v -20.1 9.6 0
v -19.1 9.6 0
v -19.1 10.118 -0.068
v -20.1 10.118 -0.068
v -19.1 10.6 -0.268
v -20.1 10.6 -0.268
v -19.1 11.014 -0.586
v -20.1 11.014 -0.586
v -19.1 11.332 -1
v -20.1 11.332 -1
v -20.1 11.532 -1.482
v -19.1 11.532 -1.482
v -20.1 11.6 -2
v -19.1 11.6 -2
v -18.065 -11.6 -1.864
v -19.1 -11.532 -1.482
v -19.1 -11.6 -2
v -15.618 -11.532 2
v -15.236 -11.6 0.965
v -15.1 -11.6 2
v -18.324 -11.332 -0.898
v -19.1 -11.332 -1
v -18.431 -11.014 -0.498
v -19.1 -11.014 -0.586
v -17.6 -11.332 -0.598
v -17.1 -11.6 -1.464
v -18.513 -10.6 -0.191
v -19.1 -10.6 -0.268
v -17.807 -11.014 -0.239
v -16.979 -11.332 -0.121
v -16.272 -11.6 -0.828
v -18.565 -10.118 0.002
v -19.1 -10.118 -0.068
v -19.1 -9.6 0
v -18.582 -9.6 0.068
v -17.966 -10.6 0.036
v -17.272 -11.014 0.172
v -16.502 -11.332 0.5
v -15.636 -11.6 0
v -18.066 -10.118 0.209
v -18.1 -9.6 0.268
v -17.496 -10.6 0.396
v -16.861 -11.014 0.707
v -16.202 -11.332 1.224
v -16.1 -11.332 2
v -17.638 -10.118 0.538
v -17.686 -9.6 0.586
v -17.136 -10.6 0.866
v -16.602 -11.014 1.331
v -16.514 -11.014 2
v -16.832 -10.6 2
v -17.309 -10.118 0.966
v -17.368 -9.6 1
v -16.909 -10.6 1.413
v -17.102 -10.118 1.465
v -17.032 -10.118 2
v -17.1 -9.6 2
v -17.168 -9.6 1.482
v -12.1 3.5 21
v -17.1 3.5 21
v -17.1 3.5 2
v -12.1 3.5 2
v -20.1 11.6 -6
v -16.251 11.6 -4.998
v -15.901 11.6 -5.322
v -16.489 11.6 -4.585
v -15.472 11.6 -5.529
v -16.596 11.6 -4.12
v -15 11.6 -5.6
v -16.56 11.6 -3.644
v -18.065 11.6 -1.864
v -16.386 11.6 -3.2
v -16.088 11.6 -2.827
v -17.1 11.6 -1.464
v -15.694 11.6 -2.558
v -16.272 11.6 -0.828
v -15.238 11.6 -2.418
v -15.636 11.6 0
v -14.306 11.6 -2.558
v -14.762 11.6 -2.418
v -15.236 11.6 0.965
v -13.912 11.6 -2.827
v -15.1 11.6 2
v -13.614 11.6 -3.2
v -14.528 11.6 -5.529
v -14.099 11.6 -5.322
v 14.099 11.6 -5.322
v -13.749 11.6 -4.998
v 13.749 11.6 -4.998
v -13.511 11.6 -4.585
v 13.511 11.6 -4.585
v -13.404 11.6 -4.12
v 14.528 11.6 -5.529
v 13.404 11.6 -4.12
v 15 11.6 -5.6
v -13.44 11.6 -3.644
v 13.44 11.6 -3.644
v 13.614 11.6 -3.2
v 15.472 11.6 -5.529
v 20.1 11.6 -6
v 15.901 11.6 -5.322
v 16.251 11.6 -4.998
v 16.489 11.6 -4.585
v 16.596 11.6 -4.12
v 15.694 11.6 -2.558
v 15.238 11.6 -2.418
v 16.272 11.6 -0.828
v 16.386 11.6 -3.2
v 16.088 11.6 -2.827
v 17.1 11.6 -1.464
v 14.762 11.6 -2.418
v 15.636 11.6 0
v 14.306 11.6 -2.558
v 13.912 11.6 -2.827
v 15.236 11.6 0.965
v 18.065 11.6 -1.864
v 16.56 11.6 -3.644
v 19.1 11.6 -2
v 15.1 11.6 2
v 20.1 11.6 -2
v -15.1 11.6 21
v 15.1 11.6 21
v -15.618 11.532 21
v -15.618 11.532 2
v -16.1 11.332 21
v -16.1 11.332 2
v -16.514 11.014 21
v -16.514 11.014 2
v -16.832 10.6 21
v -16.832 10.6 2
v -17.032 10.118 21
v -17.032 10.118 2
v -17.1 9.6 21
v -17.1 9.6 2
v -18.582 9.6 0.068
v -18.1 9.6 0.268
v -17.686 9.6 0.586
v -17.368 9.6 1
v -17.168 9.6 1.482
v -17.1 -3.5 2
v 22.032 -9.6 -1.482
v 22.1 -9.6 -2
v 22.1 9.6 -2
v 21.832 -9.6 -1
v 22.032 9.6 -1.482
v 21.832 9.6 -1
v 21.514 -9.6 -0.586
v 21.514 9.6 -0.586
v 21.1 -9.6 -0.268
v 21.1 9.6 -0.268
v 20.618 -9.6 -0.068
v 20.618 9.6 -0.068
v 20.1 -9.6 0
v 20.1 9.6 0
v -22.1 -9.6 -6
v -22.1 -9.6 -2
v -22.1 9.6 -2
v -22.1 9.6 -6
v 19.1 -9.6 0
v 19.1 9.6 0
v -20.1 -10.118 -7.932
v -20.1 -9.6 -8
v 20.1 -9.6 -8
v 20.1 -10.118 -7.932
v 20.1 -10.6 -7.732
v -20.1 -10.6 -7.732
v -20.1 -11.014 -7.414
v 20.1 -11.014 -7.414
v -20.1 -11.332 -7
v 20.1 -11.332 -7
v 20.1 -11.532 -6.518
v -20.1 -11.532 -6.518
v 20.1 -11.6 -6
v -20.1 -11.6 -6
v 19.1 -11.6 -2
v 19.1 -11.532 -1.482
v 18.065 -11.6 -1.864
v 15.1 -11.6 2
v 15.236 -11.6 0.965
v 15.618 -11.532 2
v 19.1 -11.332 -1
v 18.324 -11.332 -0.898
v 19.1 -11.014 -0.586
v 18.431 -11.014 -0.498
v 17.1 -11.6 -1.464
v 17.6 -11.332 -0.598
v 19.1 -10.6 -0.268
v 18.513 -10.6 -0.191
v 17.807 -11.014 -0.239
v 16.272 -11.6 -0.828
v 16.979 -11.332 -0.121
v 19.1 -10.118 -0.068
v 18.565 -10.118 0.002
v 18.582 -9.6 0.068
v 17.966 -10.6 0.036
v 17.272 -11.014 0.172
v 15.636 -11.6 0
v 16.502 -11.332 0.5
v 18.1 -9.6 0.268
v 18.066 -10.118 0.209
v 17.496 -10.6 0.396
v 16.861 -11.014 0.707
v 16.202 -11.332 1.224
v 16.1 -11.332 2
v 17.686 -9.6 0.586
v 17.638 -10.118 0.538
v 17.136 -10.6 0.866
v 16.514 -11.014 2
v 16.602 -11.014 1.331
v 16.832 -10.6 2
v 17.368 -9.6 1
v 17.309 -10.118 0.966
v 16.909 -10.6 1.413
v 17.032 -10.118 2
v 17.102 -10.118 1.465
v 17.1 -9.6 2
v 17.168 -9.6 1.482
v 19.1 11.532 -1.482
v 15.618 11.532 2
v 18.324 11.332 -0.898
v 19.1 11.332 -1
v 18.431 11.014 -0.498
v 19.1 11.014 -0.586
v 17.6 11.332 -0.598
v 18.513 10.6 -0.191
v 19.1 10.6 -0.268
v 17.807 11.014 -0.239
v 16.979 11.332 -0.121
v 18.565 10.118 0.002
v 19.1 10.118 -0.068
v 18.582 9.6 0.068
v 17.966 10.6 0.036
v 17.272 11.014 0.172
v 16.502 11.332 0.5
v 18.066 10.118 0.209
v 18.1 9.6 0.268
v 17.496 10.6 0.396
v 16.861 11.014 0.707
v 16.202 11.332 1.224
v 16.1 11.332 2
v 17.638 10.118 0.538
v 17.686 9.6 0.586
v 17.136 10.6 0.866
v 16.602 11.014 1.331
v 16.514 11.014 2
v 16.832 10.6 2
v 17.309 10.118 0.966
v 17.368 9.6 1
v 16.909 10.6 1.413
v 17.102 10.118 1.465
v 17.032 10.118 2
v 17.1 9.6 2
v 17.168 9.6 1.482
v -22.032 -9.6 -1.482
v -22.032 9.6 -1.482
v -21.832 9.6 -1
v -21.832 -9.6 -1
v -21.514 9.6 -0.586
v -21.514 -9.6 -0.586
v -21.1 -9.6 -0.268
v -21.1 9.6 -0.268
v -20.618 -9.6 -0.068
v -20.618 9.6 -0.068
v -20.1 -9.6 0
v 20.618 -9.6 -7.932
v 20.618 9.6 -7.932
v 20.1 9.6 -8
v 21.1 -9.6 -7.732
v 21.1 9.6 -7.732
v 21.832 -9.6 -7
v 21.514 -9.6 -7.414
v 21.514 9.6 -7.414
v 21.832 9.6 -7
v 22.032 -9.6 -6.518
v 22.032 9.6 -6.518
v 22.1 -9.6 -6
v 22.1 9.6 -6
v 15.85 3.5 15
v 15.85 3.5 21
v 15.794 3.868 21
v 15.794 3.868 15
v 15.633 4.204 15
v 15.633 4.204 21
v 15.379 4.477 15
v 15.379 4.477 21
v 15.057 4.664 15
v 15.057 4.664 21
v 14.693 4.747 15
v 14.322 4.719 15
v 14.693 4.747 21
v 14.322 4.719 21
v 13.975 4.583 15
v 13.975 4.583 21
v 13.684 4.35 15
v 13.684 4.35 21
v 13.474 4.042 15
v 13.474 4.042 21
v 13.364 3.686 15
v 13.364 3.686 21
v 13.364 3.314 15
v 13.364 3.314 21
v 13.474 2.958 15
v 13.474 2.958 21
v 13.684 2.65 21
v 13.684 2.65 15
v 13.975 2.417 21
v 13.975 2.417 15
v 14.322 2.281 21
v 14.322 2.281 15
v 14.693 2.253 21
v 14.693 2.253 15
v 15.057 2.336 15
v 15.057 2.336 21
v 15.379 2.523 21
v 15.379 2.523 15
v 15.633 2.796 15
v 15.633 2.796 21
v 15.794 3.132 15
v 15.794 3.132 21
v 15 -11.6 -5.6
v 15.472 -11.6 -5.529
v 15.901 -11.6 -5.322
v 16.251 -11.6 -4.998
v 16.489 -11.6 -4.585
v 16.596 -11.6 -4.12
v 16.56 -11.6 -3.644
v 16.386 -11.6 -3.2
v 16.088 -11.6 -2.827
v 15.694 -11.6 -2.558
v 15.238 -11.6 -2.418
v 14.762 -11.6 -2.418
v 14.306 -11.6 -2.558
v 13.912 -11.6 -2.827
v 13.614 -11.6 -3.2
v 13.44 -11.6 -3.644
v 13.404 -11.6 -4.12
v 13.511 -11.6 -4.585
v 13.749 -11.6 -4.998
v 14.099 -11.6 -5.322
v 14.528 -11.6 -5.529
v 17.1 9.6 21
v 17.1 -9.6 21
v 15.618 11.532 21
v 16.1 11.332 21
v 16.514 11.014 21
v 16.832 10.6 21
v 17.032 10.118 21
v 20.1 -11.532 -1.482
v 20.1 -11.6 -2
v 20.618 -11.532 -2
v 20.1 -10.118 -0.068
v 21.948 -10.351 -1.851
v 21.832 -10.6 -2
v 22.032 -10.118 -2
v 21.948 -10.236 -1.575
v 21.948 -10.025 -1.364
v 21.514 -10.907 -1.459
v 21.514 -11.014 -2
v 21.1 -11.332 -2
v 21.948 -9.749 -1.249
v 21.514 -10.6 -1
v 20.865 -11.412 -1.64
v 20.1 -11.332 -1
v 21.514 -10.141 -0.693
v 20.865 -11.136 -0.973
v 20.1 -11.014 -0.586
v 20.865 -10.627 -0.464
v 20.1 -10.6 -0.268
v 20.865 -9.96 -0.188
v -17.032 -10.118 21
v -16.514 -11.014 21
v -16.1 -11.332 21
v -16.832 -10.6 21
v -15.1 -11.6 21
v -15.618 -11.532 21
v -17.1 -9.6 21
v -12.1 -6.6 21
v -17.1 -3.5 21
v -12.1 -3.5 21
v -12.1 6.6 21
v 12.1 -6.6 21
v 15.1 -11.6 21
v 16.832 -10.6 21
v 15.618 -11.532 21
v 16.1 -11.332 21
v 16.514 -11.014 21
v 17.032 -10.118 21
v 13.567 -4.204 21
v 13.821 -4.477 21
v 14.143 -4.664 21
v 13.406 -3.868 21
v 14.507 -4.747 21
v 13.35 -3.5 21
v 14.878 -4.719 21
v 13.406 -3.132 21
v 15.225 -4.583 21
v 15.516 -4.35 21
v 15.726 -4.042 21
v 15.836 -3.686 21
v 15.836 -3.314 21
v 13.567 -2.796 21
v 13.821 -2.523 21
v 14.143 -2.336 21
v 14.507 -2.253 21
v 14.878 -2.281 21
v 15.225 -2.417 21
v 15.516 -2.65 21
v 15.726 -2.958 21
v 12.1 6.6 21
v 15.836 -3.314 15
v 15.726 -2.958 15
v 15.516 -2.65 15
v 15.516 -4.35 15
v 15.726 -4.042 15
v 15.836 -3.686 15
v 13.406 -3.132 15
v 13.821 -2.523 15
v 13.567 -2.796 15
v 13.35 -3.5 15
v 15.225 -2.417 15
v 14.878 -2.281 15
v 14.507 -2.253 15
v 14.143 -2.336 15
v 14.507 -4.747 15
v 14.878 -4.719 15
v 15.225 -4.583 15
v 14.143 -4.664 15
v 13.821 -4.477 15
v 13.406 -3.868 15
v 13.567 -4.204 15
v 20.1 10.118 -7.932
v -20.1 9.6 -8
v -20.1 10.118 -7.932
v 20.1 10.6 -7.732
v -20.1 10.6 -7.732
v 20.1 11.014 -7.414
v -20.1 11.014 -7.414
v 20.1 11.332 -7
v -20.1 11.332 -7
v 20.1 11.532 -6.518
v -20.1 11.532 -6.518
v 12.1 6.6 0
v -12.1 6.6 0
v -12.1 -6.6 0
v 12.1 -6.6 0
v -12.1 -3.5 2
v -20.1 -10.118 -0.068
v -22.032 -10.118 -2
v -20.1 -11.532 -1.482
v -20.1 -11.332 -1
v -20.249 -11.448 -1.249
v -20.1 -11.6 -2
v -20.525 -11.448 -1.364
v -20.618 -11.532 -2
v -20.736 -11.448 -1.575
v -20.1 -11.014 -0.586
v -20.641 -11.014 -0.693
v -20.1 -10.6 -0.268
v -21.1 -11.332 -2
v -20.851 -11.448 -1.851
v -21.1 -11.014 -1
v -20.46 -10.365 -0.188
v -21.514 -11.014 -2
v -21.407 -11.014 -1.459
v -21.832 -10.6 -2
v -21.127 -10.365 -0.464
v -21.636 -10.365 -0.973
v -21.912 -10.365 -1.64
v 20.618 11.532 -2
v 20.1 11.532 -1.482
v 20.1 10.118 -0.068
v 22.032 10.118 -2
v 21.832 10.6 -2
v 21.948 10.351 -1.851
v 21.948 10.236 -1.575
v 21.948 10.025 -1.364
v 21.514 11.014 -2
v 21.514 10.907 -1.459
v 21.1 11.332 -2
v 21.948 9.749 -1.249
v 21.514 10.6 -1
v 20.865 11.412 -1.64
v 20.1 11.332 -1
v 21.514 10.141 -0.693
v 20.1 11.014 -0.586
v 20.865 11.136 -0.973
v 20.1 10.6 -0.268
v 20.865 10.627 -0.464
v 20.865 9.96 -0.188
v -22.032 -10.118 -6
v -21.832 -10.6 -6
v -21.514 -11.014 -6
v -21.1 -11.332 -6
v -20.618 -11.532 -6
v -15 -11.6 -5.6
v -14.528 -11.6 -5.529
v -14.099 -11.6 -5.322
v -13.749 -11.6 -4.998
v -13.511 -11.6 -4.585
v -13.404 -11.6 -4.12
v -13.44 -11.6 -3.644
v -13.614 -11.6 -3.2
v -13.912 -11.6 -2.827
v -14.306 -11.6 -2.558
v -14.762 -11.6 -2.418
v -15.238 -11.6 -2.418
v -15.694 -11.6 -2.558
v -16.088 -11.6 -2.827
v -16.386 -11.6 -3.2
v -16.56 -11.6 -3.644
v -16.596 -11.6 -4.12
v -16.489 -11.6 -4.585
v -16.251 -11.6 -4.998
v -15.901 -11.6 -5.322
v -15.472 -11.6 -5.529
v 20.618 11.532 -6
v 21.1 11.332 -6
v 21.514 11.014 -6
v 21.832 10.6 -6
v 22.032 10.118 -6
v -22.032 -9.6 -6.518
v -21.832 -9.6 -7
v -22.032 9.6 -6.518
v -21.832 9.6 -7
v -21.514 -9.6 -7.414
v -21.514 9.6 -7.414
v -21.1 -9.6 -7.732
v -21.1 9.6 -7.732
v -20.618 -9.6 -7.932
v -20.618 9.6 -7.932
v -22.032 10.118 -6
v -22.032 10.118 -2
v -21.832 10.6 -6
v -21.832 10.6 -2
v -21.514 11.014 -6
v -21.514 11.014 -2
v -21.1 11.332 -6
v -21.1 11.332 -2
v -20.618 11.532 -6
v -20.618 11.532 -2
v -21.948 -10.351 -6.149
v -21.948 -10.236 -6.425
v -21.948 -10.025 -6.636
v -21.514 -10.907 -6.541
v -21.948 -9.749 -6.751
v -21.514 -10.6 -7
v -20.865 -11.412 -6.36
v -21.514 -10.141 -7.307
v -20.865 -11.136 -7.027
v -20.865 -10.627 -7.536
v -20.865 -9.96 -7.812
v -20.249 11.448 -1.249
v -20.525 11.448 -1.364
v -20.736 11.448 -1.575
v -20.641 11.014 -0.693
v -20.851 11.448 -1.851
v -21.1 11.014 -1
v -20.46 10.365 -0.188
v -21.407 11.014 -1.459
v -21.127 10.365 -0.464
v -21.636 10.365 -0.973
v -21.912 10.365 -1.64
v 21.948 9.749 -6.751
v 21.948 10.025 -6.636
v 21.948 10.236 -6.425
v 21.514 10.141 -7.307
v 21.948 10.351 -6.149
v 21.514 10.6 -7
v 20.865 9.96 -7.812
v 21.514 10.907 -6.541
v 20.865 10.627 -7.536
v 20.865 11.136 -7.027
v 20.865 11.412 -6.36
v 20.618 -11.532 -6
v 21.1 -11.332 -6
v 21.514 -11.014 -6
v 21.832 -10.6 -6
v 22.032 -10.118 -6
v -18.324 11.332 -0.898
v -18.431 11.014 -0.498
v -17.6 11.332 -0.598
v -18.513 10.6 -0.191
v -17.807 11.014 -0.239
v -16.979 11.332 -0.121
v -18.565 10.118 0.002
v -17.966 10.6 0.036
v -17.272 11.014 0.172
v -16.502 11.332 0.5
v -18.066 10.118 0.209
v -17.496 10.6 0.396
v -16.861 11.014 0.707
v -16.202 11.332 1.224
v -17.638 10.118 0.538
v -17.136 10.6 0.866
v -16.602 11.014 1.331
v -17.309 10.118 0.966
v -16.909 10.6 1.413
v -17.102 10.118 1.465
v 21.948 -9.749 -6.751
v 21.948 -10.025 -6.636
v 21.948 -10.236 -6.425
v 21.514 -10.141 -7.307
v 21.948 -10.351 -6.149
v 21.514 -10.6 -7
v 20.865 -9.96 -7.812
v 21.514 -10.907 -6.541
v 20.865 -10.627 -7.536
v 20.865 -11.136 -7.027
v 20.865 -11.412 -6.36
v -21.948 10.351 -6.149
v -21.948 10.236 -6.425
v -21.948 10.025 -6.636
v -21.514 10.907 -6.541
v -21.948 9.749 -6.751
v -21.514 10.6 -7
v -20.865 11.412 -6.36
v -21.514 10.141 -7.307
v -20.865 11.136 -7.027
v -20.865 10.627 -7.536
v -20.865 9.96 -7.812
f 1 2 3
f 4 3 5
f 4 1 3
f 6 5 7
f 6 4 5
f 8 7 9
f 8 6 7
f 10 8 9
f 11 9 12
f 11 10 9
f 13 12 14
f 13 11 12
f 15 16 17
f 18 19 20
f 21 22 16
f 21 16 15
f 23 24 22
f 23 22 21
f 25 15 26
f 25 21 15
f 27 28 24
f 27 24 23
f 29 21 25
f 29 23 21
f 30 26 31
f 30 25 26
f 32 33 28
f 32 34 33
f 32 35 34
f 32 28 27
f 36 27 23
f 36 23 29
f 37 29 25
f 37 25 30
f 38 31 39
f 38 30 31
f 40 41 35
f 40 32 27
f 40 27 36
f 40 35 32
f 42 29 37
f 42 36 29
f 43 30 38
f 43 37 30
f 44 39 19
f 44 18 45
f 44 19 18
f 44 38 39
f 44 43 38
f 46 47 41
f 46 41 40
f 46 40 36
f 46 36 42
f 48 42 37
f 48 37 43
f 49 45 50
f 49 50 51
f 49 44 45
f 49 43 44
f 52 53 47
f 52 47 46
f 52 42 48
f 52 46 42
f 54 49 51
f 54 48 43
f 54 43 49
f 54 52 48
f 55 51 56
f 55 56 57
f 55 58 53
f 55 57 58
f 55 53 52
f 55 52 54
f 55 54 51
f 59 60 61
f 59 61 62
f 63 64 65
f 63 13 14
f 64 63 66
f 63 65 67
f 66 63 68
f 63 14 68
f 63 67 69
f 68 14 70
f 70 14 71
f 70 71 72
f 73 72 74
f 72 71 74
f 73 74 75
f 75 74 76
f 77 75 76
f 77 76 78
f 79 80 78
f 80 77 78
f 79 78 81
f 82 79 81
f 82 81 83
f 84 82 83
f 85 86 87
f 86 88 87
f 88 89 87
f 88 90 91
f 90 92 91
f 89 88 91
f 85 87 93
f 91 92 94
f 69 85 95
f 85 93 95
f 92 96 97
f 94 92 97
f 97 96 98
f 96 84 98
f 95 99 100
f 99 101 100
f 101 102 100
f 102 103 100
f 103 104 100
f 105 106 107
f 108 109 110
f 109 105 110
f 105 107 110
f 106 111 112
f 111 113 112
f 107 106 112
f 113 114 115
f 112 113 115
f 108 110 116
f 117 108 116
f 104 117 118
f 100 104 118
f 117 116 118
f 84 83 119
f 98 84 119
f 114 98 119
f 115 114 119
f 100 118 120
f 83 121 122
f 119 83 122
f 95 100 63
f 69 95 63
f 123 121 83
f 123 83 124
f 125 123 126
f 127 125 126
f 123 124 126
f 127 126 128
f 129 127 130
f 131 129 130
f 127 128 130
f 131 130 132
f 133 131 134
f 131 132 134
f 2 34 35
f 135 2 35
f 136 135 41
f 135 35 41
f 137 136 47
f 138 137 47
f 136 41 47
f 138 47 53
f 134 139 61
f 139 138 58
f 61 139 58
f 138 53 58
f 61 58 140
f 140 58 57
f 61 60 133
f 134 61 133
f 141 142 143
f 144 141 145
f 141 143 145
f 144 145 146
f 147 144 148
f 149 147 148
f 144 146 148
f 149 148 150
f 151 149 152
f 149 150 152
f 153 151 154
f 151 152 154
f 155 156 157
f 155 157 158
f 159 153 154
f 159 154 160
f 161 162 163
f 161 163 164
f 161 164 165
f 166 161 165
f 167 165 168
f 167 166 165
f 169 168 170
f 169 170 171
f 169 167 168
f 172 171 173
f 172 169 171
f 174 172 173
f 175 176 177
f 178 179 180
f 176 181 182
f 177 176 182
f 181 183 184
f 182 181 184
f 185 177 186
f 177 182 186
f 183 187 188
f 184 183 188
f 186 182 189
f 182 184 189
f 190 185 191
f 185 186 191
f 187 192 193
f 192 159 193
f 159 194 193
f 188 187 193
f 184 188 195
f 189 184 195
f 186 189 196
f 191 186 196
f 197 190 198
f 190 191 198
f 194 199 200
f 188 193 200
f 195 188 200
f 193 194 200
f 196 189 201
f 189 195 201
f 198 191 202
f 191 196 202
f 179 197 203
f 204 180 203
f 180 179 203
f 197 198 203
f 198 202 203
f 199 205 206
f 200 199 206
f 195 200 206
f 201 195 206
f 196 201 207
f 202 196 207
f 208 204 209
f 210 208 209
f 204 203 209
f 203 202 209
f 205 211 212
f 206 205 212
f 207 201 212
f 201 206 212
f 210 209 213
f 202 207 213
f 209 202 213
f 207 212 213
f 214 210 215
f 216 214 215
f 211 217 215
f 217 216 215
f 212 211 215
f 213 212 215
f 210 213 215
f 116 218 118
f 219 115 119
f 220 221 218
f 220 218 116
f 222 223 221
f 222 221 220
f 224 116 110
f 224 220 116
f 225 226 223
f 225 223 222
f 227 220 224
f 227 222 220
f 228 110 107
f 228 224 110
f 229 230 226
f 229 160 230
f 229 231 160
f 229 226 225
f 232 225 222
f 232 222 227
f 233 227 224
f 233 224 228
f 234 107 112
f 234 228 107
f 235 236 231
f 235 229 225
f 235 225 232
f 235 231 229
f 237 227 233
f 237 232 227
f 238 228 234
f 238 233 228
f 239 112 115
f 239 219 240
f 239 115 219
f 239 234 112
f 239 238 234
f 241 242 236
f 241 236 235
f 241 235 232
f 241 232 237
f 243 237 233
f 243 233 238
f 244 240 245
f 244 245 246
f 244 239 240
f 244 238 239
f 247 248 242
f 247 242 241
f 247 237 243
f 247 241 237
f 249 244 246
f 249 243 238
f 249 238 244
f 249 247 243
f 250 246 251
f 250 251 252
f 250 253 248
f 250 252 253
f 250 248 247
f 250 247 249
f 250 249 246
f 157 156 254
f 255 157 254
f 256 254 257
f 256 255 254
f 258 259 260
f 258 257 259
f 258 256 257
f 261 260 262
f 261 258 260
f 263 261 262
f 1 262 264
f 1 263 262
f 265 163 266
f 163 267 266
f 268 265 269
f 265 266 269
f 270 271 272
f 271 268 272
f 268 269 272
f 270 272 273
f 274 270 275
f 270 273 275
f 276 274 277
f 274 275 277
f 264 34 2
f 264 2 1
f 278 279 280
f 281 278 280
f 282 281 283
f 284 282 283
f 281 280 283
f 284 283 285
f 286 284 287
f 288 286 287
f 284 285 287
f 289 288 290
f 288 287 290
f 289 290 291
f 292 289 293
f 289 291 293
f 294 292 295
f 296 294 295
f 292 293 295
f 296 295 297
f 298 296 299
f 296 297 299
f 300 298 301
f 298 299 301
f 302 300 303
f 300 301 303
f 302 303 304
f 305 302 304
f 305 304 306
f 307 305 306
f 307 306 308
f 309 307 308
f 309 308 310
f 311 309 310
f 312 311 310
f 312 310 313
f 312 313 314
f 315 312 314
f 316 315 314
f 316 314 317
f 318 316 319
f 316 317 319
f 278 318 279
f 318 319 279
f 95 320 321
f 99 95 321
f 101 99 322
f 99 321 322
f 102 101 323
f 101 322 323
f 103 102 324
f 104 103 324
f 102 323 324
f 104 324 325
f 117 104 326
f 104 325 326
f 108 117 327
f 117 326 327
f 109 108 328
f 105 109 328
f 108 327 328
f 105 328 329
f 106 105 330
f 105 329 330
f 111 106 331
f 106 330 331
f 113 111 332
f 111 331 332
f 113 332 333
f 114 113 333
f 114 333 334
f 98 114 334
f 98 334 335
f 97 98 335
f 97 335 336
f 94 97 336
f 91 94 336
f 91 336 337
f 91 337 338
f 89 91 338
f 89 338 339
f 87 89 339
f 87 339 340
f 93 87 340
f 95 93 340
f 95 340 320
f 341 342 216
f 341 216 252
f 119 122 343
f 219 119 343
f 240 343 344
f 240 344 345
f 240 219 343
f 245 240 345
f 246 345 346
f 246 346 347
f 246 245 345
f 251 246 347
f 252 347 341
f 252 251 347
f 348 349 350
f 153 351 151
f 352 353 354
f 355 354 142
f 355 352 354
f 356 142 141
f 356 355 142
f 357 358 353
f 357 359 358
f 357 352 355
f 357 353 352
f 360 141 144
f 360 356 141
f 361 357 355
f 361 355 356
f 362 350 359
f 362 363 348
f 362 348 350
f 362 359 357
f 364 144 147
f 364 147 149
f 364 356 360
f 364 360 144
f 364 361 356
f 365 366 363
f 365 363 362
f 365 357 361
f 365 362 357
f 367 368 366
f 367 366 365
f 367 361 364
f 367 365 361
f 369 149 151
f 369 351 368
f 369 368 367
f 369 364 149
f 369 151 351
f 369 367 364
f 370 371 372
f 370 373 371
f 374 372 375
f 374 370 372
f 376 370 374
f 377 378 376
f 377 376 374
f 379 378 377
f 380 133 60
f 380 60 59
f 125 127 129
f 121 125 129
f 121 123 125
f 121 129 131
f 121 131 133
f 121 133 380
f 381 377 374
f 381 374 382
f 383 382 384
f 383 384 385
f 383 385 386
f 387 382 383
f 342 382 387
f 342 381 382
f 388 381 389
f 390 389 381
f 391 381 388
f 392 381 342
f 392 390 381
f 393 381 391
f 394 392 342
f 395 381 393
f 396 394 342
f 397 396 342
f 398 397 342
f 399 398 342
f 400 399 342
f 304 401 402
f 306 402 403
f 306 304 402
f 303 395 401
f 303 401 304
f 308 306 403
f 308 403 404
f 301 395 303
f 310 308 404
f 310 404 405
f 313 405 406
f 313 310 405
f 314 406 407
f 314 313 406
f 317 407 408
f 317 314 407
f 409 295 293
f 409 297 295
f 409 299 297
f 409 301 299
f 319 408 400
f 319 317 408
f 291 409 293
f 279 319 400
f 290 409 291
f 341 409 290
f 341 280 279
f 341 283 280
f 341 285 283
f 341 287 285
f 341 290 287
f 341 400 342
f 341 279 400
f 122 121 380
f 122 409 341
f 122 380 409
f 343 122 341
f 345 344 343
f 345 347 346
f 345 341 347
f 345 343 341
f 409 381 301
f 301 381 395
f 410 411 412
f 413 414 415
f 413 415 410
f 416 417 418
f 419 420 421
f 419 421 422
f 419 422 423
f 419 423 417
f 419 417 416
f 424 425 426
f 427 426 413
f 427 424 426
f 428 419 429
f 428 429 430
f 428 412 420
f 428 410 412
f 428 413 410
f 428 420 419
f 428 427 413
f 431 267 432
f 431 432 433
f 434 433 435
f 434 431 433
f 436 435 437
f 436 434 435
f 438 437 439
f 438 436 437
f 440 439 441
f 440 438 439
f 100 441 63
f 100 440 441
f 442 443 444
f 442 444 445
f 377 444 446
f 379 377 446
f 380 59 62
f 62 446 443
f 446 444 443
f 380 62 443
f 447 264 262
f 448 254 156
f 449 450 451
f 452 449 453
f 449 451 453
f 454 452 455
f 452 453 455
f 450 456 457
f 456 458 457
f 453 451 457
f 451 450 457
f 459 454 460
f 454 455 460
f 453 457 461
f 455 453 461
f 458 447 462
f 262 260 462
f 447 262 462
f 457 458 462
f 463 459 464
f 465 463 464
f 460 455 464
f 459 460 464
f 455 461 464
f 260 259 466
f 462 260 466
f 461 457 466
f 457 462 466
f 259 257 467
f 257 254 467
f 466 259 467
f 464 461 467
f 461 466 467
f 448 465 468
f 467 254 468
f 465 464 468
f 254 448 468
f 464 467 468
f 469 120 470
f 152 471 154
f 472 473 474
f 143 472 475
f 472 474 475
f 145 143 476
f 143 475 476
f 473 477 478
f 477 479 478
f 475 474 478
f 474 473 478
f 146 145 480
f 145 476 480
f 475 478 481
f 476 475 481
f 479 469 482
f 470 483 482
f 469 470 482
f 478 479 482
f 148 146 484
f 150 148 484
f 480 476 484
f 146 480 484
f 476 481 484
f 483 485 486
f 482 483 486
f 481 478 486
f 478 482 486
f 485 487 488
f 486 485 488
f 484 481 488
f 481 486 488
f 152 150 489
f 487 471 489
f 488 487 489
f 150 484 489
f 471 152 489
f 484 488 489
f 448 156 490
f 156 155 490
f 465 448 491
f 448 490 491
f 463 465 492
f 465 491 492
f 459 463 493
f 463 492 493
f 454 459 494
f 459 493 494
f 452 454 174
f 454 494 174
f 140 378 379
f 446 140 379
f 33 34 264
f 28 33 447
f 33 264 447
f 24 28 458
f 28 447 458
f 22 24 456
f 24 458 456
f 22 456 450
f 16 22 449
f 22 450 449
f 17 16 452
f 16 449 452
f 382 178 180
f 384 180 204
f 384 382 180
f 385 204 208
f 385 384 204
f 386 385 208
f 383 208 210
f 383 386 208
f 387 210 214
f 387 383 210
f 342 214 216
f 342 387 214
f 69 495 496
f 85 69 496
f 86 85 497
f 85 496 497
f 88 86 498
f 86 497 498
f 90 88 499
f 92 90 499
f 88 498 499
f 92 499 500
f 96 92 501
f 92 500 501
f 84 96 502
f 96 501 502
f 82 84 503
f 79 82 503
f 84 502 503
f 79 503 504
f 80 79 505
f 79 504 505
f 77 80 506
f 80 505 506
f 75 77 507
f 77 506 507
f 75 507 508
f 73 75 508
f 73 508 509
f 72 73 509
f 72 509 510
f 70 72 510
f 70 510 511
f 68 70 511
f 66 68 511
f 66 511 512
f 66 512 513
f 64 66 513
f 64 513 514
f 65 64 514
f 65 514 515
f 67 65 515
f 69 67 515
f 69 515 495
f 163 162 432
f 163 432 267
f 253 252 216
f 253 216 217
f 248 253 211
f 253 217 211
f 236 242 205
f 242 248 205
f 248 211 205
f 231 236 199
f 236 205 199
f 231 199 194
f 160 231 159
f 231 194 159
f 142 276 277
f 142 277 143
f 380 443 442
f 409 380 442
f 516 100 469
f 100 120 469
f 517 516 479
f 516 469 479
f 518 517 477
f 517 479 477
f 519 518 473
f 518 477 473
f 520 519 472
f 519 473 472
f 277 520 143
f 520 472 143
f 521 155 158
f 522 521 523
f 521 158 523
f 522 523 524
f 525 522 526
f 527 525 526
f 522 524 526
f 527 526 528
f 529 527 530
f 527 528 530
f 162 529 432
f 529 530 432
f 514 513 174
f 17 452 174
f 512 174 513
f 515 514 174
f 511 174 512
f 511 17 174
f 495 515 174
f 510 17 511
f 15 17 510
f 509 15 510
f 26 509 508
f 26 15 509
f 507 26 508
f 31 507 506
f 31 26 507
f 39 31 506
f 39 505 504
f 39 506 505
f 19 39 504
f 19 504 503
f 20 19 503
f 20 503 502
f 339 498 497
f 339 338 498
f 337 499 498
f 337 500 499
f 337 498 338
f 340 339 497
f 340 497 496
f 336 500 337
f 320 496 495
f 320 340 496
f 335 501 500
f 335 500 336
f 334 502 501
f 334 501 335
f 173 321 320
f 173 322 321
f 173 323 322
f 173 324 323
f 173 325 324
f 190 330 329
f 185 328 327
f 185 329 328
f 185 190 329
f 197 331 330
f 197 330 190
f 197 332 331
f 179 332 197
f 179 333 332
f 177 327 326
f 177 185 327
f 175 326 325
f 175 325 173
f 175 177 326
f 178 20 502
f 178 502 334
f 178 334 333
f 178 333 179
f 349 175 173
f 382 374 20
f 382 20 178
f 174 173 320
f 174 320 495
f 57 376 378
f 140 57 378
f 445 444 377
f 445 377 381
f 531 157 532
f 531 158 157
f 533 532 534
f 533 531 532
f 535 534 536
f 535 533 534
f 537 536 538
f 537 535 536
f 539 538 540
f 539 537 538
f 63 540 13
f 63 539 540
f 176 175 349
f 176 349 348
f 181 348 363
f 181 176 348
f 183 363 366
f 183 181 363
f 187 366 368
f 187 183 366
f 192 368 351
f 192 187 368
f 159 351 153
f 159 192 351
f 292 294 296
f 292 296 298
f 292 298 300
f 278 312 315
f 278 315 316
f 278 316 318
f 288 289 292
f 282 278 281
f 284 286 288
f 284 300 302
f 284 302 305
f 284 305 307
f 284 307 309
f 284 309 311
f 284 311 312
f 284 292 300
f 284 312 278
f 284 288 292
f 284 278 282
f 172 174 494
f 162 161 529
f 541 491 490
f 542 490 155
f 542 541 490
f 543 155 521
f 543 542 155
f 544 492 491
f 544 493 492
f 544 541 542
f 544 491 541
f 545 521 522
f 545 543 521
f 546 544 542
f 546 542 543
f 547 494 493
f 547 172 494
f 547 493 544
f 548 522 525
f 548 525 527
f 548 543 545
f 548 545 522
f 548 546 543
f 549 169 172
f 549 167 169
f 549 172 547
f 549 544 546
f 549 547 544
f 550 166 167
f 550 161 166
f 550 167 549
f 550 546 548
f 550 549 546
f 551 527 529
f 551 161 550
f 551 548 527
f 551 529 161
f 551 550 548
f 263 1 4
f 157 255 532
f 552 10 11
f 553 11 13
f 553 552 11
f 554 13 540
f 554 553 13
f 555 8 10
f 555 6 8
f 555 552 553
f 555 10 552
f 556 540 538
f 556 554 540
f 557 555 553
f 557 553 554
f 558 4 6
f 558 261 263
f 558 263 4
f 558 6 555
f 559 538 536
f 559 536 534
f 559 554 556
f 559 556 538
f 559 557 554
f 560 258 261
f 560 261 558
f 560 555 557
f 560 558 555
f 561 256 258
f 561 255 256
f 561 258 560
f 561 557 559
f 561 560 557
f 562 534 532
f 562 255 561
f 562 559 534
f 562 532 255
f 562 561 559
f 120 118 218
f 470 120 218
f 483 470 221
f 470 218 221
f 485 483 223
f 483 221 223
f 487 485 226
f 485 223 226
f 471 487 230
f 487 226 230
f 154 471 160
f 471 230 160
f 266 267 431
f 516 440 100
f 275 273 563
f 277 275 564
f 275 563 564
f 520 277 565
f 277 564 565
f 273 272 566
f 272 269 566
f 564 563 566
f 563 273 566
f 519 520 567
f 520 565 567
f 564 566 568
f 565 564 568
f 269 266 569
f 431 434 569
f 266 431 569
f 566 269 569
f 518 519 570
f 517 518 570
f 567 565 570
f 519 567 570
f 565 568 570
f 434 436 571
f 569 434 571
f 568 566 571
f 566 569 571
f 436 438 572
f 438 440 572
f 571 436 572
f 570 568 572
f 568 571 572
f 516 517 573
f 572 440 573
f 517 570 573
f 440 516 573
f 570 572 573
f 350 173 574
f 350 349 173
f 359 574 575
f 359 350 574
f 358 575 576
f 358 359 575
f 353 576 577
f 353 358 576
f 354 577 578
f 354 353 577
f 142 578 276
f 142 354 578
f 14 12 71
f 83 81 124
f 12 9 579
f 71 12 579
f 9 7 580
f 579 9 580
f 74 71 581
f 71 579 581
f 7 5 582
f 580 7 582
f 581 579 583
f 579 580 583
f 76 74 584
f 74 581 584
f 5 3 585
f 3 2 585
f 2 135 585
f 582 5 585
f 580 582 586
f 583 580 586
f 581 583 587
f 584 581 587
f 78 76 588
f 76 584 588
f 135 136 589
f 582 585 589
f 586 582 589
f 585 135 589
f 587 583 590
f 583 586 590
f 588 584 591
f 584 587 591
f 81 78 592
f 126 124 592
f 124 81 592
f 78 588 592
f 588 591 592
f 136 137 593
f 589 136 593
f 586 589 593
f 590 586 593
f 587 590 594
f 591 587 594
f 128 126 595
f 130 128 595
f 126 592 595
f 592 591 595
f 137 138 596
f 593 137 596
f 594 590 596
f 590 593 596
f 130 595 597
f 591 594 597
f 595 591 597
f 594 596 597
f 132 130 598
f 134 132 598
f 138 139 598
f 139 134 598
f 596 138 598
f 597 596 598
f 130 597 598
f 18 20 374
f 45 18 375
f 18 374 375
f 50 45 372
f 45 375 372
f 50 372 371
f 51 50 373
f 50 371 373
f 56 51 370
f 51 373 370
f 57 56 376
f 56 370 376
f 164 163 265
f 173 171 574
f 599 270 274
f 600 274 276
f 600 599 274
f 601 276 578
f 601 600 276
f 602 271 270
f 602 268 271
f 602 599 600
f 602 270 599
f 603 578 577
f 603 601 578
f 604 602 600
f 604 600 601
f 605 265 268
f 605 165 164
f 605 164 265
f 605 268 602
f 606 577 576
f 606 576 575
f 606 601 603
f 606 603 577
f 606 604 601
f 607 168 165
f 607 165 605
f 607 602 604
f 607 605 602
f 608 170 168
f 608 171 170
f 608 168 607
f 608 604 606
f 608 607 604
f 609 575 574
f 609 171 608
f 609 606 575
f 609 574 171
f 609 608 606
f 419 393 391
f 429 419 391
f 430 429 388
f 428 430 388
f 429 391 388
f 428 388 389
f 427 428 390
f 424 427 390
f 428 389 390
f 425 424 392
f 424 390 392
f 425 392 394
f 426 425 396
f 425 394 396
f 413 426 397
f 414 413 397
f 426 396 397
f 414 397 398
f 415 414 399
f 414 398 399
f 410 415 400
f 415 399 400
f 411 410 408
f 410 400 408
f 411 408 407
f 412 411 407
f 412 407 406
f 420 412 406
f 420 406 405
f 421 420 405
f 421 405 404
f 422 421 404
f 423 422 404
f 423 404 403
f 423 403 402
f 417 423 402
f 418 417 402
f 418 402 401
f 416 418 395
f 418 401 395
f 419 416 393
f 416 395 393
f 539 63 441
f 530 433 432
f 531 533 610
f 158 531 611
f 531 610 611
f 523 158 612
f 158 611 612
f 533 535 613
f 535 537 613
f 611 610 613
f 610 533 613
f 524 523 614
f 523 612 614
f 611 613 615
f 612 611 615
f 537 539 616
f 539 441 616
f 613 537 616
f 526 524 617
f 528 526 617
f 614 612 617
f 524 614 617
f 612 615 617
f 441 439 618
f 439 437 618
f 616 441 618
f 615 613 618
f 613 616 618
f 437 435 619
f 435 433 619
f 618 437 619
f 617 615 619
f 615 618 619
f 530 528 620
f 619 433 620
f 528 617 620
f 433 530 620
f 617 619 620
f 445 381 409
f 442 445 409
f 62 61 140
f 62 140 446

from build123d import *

# Parameters (mm, degrees)
SKETCH2_W           = 34.2
SKETCH2_H           = 23.2
SKETCH2_W_2         = 24.2
SKETCH2_H_2         = 13.2
BOSS_EXTRUDE1_DEPTH = 21
SKETCH2_2_W         = 34.2
SKETCH2_2_H         = 23.2
SKETCH2_2_W_2       = 24.2
SKETCH2_2_H_2       = 13.2
BOSS_EXTRUDE2_DEPTH = 8
BOSS_EXTRUDE3_DEPTH = 23.2
SKETCH3_R           = 1.6
CUT_EXTRUDE1_DEPTH  = 39.309920386
FILLET1_R           = 2
SKETCH5_W           = 5
SKETCH5_H           = 7
CUT_EXTRUDE2_DEPTH  = 19
SKETCH6_R           = 1.25
CUT_EXTRUDE3_DEPTH  = 6


with BuildPart() as part:
    # Sketch2 → Boss-Extrude1 (new body)
    with BuildSketch(Plane.XY):
        Rectangle(SKETCH2_W, SKETCH2_H)
        Rectangle(SKETCH2_W_2, SKETCH2_H_2, mode=Mode.SUBTRACT)
    extrude(amount=BOSS_EXTRUDE1_DEPTH)

    # Sketch2<2> → Boss-Extrude2 (add)
    # profile 1 of 2: a face of its own
    with BuildSketch(Plane.XY):
        Rectangle(SKETCH2_2_W, SKETCH2_2_H)
        Rectangle(SKETCH2_2_W_2, SKETCH2_2_H_2, mode=Mode.SUBTRACT)
    # profile 2 of 2: a face of its own
    with BuildSketch(Plane.XY):
        Rectangle(SKETCH2_2_W_2, SKETCH2_2_H_2)
    extrude(amount=-BOSS_EXTRUDE2_DEPTH)

    # Sketch4 → Boss-Extrude3 (add)
    with BuildSketch(Plane.XZ.offset(11.6)):
        Polygon((12.1, 0), (-12.1, 0), (-22.1, 0), (-22.1, -8), (-17.1, -8), (17.1, -8), (22.1, -8), (22.1, 0), align=None)
    extrude(amount=-BOSS_EXTRUDE3_DEPTH)

    # Sketch3 → Cut-Extrude1 (cut, through all)
    with BuildSketch(Plane.XZ.offset(11.6)):
        with Locations(Location((-15, -4, 0), (0, 0, 270))):
            Circle(SKETCH3_R)
        with Locations(Location((15, -4, 0), (0, 0, 270))):
            Circle(SKETCH3_R)
    extrude(amount=-CUT_EXTRUDE1_DEPTH, mode=Mode.SUBTRACT)

    # Fillet1
    fillet1_edges = [part.edges().sort_by_distance(p)[0] for p in [
        (0, -11.6, -8),
        (0, 11.6, -8),
        (-17.1, 0, 0),
        (22.1, 0, -8),
        (17.1, 0, 0),
        (-22.1, 0, 0),
        (19.6, -11.6, 0),
        (22.1, -11.6, -4),
        (-19.6, -11.6, 0),
        (-22.1, -11.6, -4),
        (19.6, 11.6, 0),
        (22.1, 11.6, -4),
        (-19.6, 11.6, 0),
        (-22.1, 11.6, -4),
        (22.1, 0, 0),
        (-22.1, 0, -8),
        (-17.1, -11.6, 10.5),
        (-17.1, 11.6, 10.5),
        (17.1, 11.6, 10.5),
        (17.1, -11.6, 10.5),
    ]]
    fillet(fillet1_edges, radius=FILLET1_R)

    # Sketch5 → Cut-Extrude2 (cut)
    with BuildSketch(Plane.XY.offset(21)):
        with Locations((-14.6, 0)):
            Rectangle(SKETCH5_W, SKETCH5_H)
    extrude(amount=-CUT_EXTRUDE2_DEPTH, mode=Mode.SUBTRACT)

    # Sketch6 → Cut-Extrude3 (cut)
    with BuildSketch(Plane.XY.offset(21)):
        with Locations((14.6, 3.5)):
            Circle(SKETCH6_R)
        with Locations(Location((14.6, -3.5, 0), (0, 0, 180))):
            Circle(SKETCH6_R)
    extrude(amount=-CUT_EXTRUDE3_DEPTH, mode=Mode.SUBTRACT)


solid = part.part
